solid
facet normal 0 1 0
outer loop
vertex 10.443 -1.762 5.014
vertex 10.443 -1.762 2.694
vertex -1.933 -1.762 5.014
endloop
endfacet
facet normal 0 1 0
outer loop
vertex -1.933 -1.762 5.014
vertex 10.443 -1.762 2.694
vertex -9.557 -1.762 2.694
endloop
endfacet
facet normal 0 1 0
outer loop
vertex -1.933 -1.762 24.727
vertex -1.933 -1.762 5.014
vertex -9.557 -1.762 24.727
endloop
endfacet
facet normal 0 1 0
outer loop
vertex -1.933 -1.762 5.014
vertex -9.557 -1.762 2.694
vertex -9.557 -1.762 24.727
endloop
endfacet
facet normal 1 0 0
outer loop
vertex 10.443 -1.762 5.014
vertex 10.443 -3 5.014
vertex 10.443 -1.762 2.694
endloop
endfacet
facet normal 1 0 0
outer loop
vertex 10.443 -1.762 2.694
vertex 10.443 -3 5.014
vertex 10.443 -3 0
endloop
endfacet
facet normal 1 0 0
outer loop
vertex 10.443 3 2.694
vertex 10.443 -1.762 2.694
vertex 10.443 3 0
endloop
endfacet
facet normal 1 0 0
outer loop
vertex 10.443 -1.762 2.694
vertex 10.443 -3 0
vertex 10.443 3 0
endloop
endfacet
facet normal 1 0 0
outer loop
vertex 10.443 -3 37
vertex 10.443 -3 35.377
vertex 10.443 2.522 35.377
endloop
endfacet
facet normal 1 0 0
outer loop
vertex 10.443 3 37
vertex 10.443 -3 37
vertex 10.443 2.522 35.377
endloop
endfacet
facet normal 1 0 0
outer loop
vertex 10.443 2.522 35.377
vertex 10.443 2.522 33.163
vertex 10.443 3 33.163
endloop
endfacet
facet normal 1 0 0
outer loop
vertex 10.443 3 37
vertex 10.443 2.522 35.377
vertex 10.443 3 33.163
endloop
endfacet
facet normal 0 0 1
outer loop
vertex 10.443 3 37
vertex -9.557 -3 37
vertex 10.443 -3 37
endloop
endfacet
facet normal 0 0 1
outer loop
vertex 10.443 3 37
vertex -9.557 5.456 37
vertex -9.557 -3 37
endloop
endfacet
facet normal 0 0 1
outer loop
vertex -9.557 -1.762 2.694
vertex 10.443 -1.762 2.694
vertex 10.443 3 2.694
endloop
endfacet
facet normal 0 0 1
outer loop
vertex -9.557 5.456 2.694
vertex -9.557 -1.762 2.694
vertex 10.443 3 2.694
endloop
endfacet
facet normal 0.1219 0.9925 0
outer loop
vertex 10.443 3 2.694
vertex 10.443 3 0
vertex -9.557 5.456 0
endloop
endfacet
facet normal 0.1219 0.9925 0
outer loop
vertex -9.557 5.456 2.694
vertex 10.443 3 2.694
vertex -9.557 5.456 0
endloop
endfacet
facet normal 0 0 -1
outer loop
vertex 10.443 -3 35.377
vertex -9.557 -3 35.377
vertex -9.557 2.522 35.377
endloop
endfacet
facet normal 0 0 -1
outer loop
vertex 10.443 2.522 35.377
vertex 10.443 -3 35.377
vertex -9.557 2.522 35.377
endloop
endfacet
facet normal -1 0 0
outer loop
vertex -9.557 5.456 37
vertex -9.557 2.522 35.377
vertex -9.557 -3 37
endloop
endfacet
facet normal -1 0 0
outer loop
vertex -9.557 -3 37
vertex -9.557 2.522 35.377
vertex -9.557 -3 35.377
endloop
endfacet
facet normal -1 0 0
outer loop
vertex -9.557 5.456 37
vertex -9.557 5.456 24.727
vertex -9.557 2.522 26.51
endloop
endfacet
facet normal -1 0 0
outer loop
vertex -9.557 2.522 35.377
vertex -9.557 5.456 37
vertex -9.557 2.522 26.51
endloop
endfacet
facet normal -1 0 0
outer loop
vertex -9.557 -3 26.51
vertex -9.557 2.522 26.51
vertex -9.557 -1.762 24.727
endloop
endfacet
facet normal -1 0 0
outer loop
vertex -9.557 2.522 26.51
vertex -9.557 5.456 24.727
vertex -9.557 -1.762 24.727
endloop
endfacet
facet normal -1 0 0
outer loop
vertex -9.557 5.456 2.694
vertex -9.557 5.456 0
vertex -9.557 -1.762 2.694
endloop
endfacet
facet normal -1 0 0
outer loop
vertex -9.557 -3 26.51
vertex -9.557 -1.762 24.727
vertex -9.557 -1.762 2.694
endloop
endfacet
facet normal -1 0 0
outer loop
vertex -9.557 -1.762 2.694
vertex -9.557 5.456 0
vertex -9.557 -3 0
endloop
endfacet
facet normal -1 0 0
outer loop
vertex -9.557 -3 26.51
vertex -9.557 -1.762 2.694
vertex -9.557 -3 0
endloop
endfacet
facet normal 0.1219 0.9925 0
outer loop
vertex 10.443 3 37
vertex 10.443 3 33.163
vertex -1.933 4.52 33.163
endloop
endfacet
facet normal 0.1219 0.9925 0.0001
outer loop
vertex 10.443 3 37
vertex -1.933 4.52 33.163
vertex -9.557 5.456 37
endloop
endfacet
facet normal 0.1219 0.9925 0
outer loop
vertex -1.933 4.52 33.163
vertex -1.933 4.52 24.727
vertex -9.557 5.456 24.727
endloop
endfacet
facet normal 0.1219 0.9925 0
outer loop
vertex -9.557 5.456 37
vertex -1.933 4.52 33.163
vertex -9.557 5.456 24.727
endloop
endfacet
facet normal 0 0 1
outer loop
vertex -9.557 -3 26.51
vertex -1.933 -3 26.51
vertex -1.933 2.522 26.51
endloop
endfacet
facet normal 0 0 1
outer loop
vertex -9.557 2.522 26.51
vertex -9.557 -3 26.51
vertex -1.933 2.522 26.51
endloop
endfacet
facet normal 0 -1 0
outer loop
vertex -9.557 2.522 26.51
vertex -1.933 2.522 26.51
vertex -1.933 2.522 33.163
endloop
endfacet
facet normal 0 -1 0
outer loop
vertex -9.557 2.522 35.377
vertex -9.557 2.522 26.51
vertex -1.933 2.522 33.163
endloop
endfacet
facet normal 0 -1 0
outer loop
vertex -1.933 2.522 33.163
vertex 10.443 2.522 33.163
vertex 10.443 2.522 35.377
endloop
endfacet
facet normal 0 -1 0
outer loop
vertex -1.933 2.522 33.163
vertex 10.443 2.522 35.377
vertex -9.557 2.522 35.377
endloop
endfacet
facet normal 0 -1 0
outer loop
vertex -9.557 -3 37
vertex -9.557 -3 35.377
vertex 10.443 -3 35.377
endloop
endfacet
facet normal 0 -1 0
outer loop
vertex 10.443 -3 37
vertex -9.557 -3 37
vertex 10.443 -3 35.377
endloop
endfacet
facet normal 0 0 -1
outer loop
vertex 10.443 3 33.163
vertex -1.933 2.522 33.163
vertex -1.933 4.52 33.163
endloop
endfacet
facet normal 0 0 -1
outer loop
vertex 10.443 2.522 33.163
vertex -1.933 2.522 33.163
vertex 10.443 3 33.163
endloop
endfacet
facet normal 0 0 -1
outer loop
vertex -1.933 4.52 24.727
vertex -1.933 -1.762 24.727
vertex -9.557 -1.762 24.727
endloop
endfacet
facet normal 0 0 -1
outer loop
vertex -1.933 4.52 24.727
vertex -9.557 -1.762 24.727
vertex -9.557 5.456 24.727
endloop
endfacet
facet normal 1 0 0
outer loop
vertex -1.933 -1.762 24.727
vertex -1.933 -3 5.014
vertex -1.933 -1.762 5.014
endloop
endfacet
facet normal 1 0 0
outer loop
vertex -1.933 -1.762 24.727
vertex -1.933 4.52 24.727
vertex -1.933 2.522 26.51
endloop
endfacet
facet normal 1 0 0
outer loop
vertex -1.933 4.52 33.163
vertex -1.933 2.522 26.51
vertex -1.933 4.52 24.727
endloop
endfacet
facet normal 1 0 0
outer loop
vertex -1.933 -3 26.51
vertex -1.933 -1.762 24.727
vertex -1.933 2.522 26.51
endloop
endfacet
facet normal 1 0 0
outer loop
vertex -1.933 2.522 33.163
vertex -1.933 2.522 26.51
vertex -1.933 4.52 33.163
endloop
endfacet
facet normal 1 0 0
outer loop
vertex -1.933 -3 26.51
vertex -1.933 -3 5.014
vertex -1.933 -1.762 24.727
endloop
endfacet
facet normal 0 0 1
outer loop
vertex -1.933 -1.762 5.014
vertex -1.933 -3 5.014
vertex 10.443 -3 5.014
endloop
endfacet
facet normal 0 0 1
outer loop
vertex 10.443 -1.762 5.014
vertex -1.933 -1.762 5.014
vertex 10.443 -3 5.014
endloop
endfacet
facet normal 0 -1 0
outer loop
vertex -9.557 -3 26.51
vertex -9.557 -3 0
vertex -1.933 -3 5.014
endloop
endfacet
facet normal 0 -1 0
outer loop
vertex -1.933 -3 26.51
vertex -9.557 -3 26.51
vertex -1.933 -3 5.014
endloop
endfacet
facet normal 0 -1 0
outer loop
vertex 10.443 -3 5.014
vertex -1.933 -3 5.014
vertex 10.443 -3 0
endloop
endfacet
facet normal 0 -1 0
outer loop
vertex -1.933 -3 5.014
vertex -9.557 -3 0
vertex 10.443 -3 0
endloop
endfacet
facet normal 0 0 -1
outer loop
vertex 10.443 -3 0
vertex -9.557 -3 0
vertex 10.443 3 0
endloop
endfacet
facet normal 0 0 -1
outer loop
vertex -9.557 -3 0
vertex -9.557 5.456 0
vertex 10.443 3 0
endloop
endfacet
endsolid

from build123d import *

# Parameters (mm, degrees)
F0_W     = 20
F0_H     = 6
F1_DEPTH = 37
F2_W     = 13.574068
F2_H     = 22.032887
F2_W_2   = 8.901329
F2_H_2   = 8.866575
F3_DEPTH = 12.5
F4_W     = 22.673105
F4_H     = 28.148874
F5_DEPTH = 12.5


with BuildPart() as f1:
    # F0 (on Top) → F1 (new body)
    with BuildSketch(Plane.XY):
        with Locations((0.443081, 0)):
            Rectangle(F0_W, F0_H)
        Polygon((-9.556919, 3), (10.443081, 3), (-9.556919, 5.455691), align=None)
    extrude(amount=F1_DEPTH)

    # F2 (on Right) → F3 (cut, symmetric)
    with BuildSketch(Plane.YZ):
        with Locations((5.025405, 13.710695)):
            Rectangle(F2_W, F2_H)
        with Locations((-1.928942, 30.943508)):
            Rectangle(F2_W_2, F2_H_2)
    extrude(amount=F3_DEPTH, both=True, mode=Mode.SUBTRACT)

    # F4 (on Front) → F5 (cut, symmetric)
    with BuildSketch(Plane.XZ):
        with Locations((9.403651, 19.088611)):
            Rectangle(F4_W, F4_H)
    extrude(amount=F5_DEPTH, both=True, mode=Mode.SUBTRACT)


solid = f1.part
